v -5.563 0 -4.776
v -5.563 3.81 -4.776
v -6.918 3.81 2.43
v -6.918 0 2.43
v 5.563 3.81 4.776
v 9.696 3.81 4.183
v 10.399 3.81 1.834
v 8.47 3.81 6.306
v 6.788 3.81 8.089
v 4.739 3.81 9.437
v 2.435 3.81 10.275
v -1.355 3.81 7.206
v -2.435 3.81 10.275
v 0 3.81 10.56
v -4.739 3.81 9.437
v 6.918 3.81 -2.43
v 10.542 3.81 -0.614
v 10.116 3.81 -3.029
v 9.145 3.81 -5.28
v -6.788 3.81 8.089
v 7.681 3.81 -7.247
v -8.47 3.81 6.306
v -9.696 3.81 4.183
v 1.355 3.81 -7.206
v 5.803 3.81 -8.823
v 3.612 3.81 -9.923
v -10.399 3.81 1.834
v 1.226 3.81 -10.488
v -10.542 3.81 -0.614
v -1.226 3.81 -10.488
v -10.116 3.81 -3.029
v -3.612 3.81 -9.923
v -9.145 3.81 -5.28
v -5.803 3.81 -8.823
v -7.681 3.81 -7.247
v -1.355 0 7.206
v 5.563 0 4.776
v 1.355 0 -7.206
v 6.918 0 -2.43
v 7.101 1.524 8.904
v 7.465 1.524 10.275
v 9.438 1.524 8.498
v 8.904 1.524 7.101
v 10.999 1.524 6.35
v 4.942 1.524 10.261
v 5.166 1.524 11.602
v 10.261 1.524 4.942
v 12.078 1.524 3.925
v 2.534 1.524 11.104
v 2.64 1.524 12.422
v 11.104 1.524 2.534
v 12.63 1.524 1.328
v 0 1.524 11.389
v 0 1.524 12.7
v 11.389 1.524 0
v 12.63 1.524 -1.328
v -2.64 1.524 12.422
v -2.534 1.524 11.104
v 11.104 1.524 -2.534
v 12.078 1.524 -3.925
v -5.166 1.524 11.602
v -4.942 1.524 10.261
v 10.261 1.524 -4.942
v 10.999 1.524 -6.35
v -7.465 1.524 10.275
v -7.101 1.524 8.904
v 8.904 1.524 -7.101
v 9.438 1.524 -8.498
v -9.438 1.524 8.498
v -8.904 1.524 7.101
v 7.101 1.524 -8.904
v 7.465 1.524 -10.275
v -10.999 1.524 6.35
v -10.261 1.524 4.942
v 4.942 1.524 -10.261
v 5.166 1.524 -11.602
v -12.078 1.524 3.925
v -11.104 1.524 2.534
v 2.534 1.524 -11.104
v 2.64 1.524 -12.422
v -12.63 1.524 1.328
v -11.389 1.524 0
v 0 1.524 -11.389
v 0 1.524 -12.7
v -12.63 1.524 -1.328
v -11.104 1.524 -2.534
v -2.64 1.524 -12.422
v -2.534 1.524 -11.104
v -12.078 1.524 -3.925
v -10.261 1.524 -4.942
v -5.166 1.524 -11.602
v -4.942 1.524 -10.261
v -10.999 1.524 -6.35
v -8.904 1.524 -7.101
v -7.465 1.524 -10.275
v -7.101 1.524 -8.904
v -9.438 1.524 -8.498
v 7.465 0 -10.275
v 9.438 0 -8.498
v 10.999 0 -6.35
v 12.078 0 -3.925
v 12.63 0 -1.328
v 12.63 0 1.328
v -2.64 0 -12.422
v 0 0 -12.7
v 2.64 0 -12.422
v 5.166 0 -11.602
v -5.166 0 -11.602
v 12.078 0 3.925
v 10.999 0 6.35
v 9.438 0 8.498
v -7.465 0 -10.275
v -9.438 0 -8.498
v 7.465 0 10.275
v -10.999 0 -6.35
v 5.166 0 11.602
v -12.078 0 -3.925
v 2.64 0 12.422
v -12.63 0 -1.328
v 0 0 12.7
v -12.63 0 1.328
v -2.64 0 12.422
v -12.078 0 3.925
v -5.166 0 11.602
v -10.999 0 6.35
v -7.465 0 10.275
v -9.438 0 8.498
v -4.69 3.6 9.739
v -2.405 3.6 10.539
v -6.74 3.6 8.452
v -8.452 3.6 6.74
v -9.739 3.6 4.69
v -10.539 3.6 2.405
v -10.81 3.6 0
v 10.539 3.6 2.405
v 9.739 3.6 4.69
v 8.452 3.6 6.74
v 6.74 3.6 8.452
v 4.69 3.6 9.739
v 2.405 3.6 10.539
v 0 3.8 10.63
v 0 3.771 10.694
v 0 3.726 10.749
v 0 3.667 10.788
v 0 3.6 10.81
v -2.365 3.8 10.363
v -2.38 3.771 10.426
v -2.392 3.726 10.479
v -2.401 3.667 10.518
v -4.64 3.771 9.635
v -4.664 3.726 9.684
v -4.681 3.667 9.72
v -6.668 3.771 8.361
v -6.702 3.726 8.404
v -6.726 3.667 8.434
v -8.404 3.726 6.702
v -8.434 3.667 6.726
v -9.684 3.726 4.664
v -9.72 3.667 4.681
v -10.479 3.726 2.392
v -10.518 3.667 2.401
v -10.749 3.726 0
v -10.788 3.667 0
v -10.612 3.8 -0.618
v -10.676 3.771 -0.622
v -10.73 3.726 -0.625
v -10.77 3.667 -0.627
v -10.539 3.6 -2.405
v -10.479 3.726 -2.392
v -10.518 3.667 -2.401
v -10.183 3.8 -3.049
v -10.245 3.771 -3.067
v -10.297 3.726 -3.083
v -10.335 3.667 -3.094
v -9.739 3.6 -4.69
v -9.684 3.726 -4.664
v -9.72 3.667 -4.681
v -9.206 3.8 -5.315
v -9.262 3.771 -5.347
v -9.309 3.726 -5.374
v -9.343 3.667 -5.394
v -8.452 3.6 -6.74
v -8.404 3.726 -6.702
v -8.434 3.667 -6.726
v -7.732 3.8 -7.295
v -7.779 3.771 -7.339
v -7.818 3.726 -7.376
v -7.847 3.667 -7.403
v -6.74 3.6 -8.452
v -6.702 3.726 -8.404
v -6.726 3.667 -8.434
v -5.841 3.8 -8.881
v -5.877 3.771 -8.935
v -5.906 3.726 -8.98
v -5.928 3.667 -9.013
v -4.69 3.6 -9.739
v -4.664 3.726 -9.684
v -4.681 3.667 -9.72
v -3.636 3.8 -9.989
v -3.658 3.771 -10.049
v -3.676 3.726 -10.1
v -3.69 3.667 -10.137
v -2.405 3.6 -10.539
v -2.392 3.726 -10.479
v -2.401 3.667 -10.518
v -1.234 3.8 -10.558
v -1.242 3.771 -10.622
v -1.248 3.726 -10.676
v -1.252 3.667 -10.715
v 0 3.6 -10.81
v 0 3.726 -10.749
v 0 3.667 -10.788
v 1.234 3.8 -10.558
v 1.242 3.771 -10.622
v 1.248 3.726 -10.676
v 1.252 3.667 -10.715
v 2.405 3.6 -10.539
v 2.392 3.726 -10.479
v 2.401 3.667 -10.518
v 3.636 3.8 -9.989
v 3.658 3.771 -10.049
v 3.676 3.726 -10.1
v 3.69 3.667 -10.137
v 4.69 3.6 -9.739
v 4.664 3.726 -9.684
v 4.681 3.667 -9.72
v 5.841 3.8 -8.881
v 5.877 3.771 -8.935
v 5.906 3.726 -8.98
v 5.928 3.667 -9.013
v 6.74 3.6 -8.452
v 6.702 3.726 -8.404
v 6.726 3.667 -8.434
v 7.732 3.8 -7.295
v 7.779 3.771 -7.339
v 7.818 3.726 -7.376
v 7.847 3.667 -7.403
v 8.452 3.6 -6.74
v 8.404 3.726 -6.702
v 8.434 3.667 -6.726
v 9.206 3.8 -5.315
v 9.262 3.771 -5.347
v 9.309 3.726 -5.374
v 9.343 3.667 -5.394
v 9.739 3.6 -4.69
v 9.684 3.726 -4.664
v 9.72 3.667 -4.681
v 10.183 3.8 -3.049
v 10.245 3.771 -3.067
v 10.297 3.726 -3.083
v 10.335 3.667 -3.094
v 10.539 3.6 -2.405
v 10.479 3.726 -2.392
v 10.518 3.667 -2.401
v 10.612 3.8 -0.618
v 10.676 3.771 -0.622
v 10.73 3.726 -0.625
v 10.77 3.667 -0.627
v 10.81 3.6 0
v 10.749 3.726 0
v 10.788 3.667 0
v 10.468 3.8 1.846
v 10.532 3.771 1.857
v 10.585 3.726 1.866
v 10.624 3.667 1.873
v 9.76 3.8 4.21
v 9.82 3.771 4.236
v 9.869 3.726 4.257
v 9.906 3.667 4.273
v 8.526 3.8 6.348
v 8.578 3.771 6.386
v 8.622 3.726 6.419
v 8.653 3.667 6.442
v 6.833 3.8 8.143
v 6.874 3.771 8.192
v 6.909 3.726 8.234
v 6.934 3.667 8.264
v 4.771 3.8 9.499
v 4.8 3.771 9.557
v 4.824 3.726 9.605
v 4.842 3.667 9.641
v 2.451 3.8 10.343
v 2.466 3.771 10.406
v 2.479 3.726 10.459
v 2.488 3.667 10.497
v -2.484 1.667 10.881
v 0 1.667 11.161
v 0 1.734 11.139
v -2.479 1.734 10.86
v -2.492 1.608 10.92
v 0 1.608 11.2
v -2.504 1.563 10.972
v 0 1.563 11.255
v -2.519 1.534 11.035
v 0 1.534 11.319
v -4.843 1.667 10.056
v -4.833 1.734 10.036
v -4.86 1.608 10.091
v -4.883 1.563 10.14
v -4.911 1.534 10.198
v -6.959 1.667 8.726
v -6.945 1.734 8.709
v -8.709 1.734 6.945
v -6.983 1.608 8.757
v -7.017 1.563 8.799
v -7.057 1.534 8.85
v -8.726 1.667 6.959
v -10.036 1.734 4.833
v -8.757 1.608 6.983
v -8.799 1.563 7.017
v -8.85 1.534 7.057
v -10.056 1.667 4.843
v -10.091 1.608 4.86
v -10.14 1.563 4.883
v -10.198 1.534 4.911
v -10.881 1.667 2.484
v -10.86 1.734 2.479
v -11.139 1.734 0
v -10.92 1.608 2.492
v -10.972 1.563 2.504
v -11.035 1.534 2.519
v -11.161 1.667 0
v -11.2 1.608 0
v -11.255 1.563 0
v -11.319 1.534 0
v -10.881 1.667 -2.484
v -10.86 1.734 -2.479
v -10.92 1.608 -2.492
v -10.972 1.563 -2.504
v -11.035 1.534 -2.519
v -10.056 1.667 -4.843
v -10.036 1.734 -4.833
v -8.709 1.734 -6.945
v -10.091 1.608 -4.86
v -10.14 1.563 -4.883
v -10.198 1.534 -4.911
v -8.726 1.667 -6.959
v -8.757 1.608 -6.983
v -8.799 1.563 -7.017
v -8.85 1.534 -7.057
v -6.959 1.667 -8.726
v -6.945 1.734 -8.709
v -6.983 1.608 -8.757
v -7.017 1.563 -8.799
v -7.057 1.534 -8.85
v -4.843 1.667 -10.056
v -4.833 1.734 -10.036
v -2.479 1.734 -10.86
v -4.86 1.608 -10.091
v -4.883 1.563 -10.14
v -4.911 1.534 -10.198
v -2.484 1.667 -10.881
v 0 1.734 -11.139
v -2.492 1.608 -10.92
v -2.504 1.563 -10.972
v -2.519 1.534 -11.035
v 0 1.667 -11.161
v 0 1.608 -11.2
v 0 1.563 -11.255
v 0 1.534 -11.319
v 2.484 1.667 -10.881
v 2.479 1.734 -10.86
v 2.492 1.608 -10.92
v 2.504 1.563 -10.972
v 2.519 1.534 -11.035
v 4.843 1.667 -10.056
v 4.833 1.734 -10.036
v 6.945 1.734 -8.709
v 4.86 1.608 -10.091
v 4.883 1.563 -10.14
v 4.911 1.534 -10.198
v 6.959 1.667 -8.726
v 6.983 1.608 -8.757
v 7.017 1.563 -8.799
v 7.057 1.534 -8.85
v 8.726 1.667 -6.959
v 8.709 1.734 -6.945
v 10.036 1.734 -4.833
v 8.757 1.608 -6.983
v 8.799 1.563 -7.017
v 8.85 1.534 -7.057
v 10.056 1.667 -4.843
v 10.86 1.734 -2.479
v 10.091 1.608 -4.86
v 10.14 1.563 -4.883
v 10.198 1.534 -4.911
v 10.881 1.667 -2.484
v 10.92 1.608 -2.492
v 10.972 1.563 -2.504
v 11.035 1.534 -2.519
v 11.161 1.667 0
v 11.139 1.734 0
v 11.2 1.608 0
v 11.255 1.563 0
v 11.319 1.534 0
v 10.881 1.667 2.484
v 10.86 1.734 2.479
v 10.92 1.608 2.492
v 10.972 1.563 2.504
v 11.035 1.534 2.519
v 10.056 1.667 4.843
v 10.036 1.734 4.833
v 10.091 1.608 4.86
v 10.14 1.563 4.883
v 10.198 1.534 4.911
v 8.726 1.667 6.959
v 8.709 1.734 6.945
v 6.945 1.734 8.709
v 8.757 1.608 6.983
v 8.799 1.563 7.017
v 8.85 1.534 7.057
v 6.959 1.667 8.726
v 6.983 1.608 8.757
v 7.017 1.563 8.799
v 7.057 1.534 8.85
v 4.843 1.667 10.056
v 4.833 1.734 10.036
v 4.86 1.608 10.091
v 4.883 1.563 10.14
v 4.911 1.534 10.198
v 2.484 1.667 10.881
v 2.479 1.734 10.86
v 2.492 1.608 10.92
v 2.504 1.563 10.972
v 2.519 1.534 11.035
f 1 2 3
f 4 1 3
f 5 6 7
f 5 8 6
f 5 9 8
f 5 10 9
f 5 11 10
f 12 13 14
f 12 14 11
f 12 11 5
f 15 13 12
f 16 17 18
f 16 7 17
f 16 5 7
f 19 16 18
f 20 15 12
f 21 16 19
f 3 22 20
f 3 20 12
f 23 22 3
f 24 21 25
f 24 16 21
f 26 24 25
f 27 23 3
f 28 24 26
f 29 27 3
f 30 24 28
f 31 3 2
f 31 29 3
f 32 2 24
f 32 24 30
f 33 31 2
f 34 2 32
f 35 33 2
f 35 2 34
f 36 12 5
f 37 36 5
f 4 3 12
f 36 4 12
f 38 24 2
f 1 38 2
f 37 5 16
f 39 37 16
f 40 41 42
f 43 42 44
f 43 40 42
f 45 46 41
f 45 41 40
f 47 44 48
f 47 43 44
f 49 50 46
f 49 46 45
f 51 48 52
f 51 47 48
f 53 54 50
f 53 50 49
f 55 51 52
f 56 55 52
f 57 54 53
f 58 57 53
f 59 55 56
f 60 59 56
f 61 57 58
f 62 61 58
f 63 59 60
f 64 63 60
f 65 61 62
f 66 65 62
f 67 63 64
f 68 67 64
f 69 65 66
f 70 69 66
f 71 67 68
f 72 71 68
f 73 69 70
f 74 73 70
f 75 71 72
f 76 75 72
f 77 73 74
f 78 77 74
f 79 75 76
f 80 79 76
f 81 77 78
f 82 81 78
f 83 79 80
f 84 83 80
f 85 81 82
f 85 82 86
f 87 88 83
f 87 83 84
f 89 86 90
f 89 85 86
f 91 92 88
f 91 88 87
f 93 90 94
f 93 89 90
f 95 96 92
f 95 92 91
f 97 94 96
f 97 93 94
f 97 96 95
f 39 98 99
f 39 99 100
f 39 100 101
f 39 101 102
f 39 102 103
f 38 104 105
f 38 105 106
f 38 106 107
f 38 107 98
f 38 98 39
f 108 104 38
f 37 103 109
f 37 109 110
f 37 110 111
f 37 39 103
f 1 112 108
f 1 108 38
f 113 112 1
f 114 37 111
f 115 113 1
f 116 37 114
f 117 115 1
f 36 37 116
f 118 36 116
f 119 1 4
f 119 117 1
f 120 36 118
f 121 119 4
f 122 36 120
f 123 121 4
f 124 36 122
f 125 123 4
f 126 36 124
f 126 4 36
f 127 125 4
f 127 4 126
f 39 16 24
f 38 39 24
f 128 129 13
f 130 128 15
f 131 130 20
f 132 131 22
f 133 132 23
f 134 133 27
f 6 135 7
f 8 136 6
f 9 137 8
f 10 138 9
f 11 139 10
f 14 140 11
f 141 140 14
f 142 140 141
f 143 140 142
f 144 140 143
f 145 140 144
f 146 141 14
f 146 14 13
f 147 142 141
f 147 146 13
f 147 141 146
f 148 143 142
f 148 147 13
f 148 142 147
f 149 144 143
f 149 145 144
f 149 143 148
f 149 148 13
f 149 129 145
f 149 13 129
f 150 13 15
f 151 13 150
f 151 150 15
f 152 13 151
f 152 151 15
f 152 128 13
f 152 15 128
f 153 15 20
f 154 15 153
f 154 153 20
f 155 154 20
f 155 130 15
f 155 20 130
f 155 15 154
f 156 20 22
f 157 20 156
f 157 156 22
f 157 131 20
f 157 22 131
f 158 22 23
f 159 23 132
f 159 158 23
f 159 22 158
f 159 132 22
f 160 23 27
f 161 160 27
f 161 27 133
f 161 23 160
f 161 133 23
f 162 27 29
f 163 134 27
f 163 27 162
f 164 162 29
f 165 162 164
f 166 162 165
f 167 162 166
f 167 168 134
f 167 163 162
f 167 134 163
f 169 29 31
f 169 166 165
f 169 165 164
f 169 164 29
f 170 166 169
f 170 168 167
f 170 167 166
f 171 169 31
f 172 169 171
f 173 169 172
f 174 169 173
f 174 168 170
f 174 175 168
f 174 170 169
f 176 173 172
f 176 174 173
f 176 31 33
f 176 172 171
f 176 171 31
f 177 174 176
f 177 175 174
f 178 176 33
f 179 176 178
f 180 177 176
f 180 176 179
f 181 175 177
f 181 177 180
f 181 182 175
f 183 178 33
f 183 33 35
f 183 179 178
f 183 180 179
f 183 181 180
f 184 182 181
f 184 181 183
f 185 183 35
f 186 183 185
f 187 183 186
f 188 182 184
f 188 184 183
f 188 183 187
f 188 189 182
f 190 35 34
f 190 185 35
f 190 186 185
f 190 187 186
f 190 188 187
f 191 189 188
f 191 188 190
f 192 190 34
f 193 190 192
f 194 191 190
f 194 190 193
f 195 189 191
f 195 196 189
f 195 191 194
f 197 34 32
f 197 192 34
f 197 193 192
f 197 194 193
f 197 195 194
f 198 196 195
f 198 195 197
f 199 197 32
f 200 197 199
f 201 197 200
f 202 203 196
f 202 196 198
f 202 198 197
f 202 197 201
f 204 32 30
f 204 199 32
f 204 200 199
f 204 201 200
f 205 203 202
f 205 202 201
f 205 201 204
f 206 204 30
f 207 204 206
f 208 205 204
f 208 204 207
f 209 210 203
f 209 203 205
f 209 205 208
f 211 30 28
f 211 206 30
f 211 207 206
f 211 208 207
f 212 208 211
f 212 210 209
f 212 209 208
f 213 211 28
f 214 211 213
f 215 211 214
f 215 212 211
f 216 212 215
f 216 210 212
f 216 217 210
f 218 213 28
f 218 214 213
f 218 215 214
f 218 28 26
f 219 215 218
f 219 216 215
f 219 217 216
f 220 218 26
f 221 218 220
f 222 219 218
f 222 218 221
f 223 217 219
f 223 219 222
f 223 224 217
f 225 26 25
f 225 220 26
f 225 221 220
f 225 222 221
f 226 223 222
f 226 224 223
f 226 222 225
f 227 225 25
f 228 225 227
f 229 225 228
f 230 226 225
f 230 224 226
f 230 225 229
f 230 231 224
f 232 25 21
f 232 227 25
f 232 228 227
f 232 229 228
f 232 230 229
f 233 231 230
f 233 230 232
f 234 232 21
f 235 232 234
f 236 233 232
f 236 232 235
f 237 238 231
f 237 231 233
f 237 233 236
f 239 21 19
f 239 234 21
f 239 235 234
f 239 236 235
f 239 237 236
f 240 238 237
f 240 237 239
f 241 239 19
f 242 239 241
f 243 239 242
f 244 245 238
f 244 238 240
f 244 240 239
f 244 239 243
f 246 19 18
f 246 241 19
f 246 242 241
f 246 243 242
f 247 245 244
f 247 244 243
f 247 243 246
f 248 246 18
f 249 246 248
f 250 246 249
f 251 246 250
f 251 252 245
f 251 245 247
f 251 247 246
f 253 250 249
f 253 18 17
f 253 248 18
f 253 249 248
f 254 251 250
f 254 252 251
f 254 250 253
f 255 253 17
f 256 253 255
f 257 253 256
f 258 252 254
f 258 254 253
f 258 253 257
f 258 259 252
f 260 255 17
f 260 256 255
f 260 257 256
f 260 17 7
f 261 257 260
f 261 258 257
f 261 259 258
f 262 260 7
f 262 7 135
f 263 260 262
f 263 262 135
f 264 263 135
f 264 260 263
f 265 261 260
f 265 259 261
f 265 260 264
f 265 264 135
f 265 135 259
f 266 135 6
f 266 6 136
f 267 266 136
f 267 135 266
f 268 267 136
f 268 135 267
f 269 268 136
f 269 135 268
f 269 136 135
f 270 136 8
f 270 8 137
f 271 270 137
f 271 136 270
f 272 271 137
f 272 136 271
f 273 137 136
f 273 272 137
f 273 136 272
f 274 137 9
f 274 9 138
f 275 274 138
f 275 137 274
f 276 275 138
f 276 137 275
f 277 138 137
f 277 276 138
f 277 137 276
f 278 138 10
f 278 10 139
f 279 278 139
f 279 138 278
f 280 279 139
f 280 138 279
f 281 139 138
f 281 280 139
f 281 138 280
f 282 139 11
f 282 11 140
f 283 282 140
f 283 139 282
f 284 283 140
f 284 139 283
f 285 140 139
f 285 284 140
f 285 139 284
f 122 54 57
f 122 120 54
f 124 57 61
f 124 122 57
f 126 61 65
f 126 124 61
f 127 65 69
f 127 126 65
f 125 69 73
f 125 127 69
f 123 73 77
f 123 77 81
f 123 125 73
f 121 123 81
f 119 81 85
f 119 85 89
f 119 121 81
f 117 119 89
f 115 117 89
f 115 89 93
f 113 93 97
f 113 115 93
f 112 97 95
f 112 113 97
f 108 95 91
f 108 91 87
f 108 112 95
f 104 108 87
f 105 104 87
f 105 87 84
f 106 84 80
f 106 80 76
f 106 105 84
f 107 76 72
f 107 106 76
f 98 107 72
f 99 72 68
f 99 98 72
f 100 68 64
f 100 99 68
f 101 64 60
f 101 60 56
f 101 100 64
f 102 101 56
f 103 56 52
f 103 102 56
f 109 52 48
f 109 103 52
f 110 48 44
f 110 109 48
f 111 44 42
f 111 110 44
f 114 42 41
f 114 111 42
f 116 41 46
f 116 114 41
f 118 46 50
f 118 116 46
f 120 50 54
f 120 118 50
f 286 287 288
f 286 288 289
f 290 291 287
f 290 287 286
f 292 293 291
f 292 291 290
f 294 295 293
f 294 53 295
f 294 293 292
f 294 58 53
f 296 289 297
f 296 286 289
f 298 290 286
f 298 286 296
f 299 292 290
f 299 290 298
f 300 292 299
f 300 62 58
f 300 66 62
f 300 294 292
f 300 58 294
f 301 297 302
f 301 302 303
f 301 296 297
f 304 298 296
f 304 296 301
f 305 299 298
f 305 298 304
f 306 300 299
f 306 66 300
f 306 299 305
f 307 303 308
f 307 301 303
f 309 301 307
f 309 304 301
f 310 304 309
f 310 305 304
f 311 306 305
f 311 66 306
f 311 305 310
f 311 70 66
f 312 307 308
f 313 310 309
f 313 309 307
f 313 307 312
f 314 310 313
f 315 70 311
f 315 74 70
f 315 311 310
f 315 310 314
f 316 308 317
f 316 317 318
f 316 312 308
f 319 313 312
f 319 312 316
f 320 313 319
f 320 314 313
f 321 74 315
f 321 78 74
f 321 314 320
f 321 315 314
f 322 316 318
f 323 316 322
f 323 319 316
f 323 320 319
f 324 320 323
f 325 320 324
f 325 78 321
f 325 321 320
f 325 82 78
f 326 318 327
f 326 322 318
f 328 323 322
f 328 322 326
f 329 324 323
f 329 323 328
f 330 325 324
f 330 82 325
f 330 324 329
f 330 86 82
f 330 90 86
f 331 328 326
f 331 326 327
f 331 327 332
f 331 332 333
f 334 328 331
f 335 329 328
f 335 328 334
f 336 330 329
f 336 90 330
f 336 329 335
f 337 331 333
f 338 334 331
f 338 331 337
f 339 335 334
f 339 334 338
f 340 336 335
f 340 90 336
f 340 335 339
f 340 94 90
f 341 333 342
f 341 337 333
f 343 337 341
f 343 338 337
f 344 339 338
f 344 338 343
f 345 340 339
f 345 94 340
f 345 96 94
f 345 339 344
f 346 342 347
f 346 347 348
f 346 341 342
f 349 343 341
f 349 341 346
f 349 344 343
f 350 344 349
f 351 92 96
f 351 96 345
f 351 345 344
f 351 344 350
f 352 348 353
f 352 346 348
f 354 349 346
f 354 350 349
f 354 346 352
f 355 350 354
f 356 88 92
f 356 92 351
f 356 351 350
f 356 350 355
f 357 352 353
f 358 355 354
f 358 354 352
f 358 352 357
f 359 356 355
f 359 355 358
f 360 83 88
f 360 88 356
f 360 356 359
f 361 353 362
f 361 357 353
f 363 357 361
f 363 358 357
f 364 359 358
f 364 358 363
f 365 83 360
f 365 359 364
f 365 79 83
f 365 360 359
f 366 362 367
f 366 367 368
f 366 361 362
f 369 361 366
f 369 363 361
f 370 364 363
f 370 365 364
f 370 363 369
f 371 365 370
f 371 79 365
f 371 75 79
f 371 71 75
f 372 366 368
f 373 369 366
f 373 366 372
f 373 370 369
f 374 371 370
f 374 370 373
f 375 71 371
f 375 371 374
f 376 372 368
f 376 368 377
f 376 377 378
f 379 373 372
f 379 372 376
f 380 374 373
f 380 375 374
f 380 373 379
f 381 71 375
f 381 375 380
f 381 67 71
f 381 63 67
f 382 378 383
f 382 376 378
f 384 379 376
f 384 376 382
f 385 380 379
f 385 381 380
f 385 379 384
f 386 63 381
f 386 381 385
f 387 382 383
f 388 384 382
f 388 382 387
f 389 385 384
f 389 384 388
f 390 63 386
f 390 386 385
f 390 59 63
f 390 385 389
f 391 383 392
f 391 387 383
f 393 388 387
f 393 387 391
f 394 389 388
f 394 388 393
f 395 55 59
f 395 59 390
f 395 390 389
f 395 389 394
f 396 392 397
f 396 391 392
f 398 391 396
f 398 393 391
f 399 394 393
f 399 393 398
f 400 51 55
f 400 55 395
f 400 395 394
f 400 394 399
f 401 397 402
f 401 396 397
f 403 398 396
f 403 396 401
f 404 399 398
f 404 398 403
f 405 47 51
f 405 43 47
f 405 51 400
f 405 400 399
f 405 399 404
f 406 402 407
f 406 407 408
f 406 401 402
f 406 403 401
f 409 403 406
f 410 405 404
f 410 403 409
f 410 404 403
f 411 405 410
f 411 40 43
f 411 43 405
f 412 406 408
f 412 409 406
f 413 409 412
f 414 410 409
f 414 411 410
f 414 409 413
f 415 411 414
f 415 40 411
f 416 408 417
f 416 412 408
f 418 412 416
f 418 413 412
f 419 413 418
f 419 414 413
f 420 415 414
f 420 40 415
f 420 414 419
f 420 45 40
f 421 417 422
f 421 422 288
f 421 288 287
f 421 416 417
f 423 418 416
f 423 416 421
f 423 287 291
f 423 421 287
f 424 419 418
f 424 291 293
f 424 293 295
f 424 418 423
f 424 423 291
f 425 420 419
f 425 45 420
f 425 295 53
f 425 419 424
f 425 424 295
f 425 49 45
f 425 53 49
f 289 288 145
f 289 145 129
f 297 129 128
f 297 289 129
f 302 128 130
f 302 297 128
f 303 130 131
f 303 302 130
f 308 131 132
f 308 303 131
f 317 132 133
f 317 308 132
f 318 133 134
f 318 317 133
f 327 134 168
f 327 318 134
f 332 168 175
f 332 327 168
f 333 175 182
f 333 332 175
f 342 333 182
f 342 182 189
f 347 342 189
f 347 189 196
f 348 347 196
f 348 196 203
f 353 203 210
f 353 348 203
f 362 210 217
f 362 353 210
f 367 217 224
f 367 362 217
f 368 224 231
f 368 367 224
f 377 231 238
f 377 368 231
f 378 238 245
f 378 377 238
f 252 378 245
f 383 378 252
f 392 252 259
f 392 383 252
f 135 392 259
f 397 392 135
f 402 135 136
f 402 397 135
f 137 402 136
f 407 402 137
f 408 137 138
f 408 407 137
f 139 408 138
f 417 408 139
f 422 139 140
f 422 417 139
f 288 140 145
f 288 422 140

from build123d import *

# Parameters (mm, degrees)
CUT_EXTRUDE1_DEPTH = 19.360177014
FILLET1_R          = 0.254


with BuildPart() as part:
    # Sketch1 → Revolve1 (revolve)
    with BuildSketch(Plane(origin=(0, 0, 0), x_dir=(0, 0, -1), z_dir=(1, 0, 0)), mode=Mode.PRIVATE) as revolve1_sk:
        Polygon((0, 3.81), (10.772916522, 3.81), (11.176, 1.524), (12.7, 1.524), (12.7, 0), (0, 0), align=None)
    revolve(revolve1_sk.sketch.rotate(Axis((0, 8.524875, 0), (0, -1, 0)), 180), axis=Axis((0, 8.524875, 0), (0, -1, 0)))

    # Sketch2 → Cut-Extrude1 (cut, through all)
    with BuildSketch(Plane(origin=(0, 3.81, 0), x_dir=(1, 0, 0), z_dir=(0, 1, 0))):
        Polygon((5.563452778, -4.776120446), (6.917968027, 2.430031215), (1.354515249, 7.206151662), (-5.563452778, 4.776120446), (-6.917968027, -2.430031215), (-1.354515249, -7.206151662), align=None)
    extrude(amount=-CUT_EXTRUDE1_DEPTH, mode=Mode.SUBTRACT)

    # Fillet1
    fillet1_edges = [part.edges().sort_by_distance(p)[0] for p in [
        (0, 1.524, -11.176),
        (0, 3.81, -10.772916522),
    ]]
    fillet(fillet1_edges, radius=FILLET1_R)


solid = part.part
